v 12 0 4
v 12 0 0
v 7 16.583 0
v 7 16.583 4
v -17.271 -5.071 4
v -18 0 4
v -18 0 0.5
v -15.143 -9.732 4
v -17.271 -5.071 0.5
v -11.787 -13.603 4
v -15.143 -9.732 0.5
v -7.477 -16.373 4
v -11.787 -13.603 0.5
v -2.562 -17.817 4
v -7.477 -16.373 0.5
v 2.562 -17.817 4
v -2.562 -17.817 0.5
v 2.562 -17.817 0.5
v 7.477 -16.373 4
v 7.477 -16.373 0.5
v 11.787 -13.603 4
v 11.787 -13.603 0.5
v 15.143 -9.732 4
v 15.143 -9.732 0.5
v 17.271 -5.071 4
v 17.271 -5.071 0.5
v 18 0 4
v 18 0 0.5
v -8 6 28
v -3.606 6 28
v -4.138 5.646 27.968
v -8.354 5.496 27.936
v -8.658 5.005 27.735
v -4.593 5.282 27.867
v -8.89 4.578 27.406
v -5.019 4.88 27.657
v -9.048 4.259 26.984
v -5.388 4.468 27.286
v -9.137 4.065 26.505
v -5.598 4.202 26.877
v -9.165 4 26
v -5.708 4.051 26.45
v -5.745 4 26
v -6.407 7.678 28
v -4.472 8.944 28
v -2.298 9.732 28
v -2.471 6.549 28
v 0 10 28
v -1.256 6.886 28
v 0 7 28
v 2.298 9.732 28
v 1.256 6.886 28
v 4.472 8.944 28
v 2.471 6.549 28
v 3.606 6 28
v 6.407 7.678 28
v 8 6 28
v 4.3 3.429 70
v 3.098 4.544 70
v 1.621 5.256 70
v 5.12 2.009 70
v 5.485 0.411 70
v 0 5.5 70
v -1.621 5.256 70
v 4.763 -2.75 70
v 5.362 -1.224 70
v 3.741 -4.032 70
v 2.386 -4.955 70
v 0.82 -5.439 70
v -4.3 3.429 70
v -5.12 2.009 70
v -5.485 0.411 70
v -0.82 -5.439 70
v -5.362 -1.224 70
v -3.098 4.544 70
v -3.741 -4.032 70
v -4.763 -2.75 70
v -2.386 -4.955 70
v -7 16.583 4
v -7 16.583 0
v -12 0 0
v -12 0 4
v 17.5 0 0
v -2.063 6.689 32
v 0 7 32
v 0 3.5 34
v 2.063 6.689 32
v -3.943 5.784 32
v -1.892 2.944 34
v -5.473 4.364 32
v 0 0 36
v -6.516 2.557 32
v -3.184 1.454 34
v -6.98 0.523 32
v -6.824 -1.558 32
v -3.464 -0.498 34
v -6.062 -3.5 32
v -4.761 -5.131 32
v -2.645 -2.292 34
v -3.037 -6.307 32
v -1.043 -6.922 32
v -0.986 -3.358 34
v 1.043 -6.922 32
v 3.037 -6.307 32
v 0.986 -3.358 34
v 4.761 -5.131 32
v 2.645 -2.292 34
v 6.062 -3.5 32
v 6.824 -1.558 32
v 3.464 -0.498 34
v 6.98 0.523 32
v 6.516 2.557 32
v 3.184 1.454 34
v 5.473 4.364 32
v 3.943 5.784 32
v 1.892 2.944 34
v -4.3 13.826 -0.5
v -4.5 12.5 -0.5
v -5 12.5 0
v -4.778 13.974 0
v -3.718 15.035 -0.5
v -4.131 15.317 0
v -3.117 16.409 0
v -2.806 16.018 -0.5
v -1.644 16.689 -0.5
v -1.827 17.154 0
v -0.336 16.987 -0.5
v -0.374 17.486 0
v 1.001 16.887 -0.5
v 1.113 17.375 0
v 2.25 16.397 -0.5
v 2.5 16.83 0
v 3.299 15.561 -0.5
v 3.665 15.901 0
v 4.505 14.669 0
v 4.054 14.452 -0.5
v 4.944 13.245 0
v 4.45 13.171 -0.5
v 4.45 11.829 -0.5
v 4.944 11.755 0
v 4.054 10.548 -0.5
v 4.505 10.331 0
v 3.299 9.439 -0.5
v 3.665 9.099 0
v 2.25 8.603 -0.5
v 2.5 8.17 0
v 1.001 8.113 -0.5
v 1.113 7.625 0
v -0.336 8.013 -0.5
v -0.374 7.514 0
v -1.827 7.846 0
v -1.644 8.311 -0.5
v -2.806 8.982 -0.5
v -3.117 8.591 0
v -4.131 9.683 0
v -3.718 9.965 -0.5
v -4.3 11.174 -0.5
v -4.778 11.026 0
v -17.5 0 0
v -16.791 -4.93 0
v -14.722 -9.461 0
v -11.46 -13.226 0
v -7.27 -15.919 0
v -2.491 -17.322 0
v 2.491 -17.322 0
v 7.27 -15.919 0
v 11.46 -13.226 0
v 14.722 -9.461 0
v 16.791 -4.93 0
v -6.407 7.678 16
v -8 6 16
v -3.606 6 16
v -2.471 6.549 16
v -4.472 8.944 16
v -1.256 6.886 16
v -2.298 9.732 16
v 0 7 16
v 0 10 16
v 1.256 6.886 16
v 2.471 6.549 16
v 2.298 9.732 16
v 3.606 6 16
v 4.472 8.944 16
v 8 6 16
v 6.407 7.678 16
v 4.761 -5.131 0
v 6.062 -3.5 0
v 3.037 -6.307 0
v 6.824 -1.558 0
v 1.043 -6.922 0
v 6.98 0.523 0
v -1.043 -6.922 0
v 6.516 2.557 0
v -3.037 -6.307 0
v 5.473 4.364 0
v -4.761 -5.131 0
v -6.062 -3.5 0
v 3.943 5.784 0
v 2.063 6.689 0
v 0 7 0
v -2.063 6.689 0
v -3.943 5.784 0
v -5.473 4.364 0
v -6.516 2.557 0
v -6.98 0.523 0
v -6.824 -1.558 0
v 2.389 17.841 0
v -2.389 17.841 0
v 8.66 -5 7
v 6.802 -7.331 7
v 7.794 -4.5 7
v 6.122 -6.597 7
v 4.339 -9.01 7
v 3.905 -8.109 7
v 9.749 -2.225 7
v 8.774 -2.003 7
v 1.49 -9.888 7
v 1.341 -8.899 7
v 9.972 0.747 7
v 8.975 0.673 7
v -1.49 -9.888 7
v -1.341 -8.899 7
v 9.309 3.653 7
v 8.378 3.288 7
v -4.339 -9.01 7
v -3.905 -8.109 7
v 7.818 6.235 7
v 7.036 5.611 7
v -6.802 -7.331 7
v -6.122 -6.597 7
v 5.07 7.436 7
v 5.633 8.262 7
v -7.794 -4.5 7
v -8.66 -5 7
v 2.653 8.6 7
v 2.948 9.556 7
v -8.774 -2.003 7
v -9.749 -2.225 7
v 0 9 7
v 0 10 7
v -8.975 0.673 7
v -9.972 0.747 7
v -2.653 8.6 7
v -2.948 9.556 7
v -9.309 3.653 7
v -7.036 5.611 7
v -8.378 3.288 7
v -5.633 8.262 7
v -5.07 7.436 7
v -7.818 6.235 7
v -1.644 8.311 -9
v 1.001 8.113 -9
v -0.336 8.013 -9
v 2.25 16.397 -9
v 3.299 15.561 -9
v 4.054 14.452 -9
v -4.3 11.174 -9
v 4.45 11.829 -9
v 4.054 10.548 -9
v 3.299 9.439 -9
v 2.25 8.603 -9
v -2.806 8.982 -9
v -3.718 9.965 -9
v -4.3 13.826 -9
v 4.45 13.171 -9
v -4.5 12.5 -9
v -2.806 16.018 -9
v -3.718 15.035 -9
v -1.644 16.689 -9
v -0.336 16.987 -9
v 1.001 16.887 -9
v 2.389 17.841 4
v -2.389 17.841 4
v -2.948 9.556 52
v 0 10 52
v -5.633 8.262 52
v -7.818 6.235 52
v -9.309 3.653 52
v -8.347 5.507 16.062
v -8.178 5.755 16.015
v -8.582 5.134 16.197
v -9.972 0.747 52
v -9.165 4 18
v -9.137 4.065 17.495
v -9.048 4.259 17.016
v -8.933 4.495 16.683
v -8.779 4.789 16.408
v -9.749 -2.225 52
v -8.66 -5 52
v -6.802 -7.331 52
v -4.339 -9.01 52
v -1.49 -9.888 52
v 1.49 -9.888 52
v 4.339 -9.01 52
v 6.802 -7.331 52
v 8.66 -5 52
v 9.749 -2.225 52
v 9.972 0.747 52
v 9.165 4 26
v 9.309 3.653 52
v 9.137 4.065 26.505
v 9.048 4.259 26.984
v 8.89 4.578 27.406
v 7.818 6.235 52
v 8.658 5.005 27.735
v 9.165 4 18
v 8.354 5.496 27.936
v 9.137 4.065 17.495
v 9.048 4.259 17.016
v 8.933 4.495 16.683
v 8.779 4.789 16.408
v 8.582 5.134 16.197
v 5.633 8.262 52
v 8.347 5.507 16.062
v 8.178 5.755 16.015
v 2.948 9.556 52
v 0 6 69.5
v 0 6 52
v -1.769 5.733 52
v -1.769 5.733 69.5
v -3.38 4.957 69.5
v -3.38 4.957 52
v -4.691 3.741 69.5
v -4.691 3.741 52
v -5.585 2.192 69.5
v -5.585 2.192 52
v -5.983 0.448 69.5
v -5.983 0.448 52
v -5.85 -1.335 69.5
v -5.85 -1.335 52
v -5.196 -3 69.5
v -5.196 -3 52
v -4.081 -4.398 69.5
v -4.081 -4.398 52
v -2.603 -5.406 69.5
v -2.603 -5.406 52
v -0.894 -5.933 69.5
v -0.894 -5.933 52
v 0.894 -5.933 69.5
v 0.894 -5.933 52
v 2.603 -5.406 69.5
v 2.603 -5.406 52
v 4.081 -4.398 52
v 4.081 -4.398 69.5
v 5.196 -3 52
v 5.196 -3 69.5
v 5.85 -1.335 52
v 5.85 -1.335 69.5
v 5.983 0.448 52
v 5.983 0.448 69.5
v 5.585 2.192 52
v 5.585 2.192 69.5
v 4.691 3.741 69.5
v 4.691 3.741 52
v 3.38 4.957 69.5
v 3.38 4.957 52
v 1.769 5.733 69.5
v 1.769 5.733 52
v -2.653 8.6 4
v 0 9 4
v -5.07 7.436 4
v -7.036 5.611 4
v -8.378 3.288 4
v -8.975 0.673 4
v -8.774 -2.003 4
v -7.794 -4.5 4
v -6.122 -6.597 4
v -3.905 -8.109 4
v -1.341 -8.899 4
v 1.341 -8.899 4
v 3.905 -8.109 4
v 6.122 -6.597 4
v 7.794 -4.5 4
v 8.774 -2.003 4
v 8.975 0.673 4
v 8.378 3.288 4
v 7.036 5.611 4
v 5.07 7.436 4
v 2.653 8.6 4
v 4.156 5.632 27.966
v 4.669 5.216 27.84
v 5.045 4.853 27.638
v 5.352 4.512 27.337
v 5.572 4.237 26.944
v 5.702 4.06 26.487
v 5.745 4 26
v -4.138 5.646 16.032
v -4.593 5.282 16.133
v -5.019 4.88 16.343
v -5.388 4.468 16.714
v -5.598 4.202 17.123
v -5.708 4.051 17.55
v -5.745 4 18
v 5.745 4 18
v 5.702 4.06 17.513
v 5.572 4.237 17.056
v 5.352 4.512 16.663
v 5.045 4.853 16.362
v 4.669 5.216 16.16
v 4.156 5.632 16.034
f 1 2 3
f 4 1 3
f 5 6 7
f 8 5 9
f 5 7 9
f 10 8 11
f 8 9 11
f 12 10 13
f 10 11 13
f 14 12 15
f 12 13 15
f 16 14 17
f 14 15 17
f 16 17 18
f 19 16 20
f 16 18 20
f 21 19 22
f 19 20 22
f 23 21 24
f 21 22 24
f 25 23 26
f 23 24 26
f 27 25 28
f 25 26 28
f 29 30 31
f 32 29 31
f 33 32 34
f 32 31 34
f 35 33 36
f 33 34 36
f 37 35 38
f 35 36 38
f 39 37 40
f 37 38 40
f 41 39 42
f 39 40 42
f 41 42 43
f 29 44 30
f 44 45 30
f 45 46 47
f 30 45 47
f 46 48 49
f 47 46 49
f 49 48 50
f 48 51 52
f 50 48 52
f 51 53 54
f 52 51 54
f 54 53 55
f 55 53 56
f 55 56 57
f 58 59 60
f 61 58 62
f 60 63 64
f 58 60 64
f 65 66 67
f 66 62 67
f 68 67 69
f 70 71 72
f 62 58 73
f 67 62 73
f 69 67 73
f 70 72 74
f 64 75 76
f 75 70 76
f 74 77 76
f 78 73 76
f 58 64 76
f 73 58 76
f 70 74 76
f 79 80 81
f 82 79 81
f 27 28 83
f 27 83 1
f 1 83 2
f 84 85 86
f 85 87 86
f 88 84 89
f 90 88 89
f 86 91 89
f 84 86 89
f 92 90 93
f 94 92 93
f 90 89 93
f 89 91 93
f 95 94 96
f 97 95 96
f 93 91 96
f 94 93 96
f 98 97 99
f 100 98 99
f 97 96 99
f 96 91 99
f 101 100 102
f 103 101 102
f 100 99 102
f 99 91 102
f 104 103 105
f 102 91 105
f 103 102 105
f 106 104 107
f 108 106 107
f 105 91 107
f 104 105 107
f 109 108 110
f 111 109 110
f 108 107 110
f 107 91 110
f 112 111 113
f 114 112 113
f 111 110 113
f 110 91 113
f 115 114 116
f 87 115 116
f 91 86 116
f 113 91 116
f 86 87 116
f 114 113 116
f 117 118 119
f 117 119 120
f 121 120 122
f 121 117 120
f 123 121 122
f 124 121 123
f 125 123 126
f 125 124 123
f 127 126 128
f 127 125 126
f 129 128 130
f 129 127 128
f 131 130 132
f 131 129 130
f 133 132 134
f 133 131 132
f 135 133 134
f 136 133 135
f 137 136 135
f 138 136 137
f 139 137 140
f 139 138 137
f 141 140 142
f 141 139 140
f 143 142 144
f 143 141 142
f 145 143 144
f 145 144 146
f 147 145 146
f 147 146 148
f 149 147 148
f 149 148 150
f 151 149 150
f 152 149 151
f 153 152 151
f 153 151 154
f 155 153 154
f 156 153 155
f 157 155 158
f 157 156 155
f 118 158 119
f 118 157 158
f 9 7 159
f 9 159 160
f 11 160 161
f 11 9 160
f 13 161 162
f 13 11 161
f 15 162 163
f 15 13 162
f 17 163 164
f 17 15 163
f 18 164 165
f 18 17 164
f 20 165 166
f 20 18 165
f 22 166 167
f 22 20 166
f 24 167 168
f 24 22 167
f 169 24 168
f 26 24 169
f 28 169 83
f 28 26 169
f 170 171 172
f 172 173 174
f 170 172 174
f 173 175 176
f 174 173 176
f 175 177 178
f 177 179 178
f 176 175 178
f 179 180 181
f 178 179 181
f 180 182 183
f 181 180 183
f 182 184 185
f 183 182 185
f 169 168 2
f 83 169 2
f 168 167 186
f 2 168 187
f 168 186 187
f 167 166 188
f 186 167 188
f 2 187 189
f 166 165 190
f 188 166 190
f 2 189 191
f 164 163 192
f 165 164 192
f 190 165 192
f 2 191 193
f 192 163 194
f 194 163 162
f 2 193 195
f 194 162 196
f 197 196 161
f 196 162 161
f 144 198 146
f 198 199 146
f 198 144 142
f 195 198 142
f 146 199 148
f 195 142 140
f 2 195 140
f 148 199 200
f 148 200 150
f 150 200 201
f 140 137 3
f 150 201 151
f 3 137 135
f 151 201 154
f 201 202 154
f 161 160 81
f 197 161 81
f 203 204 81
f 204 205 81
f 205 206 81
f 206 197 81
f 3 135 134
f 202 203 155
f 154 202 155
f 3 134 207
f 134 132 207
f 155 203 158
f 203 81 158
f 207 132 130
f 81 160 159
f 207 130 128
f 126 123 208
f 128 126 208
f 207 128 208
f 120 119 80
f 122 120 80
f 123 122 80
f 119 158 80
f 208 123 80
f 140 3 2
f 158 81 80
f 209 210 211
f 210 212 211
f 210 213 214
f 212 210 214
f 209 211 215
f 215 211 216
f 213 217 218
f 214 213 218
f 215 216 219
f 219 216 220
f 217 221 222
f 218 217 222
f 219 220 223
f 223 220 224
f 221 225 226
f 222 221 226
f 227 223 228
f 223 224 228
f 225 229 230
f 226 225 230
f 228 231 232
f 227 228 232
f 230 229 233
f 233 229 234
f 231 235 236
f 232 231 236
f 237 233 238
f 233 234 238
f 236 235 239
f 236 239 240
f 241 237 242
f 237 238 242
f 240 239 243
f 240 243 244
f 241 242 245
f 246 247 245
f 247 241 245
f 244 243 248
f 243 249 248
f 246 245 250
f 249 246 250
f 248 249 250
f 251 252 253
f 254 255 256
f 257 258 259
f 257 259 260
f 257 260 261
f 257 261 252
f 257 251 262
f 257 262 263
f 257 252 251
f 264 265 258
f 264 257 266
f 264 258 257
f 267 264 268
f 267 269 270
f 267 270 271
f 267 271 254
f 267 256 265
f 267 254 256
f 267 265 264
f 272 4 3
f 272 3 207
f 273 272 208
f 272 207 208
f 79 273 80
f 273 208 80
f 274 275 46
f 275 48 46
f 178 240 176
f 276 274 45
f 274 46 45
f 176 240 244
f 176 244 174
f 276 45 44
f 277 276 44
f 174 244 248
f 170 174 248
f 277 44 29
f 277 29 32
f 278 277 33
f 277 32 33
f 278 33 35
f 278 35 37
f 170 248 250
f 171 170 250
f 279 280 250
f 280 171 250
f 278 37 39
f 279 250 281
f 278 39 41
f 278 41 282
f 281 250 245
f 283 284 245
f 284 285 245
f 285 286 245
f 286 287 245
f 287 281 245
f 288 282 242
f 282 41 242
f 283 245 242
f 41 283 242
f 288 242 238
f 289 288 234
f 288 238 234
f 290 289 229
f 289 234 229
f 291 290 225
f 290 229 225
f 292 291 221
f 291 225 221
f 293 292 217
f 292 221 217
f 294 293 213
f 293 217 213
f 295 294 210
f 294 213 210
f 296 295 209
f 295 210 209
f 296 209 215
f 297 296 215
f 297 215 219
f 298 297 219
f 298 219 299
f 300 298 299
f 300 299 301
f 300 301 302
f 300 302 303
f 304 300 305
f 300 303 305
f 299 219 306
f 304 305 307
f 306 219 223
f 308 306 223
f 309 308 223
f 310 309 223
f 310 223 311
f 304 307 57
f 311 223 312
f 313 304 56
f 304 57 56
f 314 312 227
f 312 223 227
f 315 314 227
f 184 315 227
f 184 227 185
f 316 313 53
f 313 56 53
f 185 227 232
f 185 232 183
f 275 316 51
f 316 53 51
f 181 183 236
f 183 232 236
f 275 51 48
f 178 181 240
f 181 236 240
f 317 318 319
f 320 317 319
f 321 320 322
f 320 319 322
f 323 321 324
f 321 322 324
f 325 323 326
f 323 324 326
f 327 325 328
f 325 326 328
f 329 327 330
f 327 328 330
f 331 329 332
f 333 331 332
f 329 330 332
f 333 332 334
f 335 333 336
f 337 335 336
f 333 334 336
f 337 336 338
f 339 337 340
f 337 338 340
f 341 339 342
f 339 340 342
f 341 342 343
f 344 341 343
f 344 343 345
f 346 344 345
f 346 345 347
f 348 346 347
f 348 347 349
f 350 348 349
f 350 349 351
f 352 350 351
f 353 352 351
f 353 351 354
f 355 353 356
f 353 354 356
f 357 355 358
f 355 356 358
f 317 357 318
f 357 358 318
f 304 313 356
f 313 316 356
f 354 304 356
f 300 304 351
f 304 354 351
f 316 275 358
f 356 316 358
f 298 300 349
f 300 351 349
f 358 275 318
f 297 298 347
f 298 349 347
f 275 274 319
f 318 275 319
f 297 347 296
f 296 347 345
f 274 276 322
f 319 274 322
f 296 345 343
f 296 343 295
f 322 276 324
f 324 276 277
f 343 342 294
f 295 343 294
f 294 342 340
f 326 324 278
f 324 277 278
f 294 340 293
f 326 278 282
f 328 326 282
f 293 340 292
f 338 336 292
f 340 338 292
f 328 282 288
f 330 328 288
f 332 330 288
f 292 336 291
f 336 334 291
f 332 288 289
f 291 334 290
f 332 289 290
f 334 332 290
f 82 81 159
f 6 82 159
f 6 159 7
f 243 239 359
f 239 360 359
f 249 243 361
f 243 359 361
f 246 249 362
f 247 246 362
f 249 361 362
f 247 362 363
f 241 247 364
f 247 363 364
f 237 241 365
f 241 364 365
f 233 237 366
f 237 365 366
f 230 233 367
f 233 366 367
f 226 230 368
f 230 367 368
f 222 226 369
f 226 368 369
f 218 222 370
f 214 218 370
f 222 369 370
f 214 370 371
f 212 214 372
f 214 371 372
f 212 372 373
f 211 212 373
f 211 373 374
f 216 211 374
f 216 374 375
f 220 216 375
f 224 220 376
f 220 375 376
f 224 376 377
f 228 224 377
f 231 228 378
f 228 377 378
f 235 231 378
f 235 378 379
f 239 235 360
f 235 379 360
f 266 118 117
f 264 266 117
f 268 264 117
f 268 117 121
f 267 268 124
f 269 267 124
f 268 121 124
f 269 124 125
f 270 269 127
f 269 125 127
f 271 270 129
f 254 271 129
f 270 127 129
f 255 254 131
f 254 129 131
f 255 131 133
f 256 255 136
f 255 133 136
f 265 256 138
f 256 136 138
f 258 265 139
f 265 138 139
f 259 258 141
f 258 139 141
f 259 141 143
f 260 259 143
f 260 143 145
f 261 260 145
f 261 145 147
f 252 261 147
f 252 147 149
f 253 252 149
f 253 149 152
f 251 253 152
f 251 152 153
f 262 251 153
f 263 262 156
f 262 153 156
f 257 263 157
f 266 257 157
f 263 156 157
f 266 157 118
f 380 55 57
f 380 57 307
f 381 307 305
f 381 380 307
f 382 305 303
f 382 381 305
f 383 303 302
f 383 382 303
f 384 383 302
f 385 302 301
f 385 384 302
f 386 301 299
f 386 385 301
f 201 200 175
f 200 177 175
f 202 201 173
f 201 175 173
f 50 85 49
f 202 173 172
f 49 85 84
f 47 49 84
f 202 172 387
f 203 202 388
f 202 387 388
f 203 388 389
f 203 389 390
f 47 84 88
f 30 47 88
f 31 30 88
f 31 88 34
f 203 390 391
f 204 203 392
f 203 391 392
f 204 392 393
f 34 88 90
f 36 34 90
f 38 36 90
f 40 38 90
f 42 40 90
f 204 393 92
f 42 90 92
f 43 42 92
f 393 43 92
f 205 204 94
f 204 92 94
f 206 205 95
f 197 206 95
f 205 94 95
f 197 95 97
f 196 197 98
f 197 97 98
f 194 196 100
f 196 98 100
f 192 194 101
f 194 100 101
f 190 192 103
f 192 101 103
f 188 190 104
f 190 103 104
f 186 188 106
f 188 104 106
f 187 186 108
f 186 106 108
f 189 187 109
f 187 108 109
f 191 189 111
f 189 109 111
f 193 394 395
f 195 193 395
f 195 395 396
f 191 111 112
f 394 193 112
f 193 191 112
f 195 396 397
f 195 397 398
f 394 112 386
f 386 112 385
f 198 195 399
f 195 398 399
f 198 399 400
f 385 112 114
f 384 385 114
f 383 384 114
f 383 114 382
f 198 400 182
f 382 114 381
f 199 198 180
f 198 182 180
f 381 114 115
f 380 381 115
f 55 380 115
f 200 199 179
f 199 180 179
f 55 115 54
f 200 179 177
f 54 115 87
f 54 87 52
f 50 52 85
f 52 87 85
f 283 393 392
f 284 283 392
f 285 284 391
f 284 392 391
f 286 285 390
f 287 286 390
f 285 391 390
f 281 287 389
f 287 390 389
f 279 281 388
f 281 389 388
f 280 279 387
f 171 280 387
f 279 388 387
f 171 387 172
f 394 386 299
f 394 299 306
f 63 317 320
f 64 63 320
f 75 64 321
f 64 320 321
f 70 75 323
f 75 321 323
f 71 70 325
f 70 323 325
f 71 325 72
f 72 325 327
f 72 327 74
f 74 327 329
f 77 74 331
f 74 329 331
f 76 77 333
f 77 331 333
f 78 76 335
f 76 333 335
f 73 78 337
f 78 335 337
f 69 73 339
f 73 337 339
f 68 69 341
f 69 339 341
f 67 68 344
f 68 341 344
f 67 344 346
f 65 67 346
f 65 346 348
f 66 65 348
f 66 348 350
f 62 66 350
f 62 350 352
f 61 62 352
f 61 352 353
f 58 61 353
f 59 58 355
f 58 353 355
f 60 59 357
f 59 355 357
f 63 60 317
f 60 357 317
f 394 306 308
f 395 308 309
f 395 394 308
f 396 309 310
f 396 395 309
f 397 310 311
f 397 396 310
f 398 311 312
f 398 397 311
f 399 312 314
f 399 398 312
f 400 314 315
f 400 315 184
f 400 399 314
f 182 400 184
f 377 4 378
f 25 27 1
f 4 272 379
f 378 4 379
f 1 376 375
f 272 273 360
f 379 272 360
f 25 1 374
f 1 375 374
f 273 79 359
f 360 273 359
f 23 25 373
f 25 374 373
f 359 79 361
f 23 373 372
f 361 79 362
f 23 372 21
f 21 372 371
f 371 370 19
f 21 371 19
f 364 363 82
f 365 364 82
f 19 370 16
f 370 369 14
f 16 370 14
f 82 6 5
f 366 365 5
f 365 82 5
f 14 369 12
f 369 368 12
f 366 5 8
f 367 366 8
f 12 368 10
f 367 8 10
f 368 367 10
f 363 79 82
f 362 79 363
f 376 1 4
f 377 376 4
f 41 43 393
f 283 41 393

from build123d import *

# Parameters (mm, degrees)
ENL_V_MAT_EXTRU_1_DEPTH      = 19
ENL_V_MAT_EXTRU_1_DEPTH_BACK = 19
ESQUISSE4_OUTSIDE_W          = 55.312
ESQUISSE4_OUTSIDE_H          = 55.312
ENL_V_MAT_EXTRU_2_DEPTH      = 10
ESQUISSE5_R                  = 4.5
BOSS_EXTRU_1_DEPTH           = 9
CHANFREIN1_SIZE              = 0.5


with BuildPart() as part:
    # Esquisse2 → Révolution2 (revolve)
    with BuildSketch(Plane(origin=(0, 0, 0), x_dir=(0, 0, -1), z_dir=(1, 0, 0))):
        Polygon((-36, 0), (-70, 0), (-70, 6), (-52, 6), (-52, 10), (-7, 10), (-7, 9), (-4, 9), (-4, 18), (0, 18), (0, 7), (-32, 7), align=None)
    revolve(axis=Axis((0, 0, 0), (0, 0, 1)))

    # Esquisse3 → Enlèv. mat.-Extru.1 (cut, two sides)
    with BuildSketch(Plane(origin=(0, 0, 0), x_dir=(0, 0, -1), z_dir=(1, 0, 0))) as enl_v_mat_extru_1_sk:
        with BuildLine():
            Line((-16, 10), (-28, 10))
            Line((-28, 10), (-28, 6))
            ThreePointArc((-28, 6), (-27.414213562, 4.585786438), (-26, 4))
            Line((-26, 4), (-18, 4))
            ThreePointArc((-18, 4), (-16.585786438, 4.585786438), (-16, 6))
            Line((-16, 6), (-16, 10))
        make_face()
    extrude(amount=ENL_V_MAT_EXTRU_1_DEPTH, mode=Mode.SUBTRACT)
    extrude(enl_v_mat_extru_1_sk.sketch, amount=-ENL_V_MAT_EXTRU_1_DEPTH_BACK, mode=Mode.SUBTRACT)

    # Esquisse4 outside → Enlèv. mat.-Extru.2 (cut)
    with BuildSketch(Plane(origin=(0, 0, 0), x_dir=(-1, 0, 0), z_dir=(0, 0, -1))):
        Rectangle(ESQUISSE4_OUTSIDE_W, ESQUISSE4_OUTSIDE_H)
        with BuildLine():
            Line((-18, 0), (-12, 0))
            Line((-12, 0), (-7, 16.583123952))
            ThreePointArc((-7, 16.583123952), (0, 18), (7, 16.583123952))
            Line((7, 16.583123952), (12, 0))
            Line((12, 0), (18, 0))
            ThreePointArc((18, 0), (0, -18), (-18, 0))
        make_face(mode=Mode.SUBTRACT)
    extrude(amount=-ENL_V_MAT_EXTRU_2_DEPTH, mode=Mode.SUBTRACT)

    # Esquisse5 → Boss.-Extru.1 (add)
    with BuildSketch(Plane(origin=(0, 0, 0), x_dir=(-1, 0, 0), z_dir=(0, 0, -1))):
        with Locations((0, 12.5)):
            Circle(ESQUISSE5_R)
    extrude(amount=BOSS_EXTRU_1_DEPTH)

    # Chanfrein1
    chanfrein1_edges = [part.edges().sort_by_distance(p)[0] for p in [
        (4.5, 12.5, 0),
        (0, -6, 70),
        (0, -18, 0),
    ]]
    chamfer(chanfrein1_edges, length=CHANFREIN1_SIZE)


solid = part.part
